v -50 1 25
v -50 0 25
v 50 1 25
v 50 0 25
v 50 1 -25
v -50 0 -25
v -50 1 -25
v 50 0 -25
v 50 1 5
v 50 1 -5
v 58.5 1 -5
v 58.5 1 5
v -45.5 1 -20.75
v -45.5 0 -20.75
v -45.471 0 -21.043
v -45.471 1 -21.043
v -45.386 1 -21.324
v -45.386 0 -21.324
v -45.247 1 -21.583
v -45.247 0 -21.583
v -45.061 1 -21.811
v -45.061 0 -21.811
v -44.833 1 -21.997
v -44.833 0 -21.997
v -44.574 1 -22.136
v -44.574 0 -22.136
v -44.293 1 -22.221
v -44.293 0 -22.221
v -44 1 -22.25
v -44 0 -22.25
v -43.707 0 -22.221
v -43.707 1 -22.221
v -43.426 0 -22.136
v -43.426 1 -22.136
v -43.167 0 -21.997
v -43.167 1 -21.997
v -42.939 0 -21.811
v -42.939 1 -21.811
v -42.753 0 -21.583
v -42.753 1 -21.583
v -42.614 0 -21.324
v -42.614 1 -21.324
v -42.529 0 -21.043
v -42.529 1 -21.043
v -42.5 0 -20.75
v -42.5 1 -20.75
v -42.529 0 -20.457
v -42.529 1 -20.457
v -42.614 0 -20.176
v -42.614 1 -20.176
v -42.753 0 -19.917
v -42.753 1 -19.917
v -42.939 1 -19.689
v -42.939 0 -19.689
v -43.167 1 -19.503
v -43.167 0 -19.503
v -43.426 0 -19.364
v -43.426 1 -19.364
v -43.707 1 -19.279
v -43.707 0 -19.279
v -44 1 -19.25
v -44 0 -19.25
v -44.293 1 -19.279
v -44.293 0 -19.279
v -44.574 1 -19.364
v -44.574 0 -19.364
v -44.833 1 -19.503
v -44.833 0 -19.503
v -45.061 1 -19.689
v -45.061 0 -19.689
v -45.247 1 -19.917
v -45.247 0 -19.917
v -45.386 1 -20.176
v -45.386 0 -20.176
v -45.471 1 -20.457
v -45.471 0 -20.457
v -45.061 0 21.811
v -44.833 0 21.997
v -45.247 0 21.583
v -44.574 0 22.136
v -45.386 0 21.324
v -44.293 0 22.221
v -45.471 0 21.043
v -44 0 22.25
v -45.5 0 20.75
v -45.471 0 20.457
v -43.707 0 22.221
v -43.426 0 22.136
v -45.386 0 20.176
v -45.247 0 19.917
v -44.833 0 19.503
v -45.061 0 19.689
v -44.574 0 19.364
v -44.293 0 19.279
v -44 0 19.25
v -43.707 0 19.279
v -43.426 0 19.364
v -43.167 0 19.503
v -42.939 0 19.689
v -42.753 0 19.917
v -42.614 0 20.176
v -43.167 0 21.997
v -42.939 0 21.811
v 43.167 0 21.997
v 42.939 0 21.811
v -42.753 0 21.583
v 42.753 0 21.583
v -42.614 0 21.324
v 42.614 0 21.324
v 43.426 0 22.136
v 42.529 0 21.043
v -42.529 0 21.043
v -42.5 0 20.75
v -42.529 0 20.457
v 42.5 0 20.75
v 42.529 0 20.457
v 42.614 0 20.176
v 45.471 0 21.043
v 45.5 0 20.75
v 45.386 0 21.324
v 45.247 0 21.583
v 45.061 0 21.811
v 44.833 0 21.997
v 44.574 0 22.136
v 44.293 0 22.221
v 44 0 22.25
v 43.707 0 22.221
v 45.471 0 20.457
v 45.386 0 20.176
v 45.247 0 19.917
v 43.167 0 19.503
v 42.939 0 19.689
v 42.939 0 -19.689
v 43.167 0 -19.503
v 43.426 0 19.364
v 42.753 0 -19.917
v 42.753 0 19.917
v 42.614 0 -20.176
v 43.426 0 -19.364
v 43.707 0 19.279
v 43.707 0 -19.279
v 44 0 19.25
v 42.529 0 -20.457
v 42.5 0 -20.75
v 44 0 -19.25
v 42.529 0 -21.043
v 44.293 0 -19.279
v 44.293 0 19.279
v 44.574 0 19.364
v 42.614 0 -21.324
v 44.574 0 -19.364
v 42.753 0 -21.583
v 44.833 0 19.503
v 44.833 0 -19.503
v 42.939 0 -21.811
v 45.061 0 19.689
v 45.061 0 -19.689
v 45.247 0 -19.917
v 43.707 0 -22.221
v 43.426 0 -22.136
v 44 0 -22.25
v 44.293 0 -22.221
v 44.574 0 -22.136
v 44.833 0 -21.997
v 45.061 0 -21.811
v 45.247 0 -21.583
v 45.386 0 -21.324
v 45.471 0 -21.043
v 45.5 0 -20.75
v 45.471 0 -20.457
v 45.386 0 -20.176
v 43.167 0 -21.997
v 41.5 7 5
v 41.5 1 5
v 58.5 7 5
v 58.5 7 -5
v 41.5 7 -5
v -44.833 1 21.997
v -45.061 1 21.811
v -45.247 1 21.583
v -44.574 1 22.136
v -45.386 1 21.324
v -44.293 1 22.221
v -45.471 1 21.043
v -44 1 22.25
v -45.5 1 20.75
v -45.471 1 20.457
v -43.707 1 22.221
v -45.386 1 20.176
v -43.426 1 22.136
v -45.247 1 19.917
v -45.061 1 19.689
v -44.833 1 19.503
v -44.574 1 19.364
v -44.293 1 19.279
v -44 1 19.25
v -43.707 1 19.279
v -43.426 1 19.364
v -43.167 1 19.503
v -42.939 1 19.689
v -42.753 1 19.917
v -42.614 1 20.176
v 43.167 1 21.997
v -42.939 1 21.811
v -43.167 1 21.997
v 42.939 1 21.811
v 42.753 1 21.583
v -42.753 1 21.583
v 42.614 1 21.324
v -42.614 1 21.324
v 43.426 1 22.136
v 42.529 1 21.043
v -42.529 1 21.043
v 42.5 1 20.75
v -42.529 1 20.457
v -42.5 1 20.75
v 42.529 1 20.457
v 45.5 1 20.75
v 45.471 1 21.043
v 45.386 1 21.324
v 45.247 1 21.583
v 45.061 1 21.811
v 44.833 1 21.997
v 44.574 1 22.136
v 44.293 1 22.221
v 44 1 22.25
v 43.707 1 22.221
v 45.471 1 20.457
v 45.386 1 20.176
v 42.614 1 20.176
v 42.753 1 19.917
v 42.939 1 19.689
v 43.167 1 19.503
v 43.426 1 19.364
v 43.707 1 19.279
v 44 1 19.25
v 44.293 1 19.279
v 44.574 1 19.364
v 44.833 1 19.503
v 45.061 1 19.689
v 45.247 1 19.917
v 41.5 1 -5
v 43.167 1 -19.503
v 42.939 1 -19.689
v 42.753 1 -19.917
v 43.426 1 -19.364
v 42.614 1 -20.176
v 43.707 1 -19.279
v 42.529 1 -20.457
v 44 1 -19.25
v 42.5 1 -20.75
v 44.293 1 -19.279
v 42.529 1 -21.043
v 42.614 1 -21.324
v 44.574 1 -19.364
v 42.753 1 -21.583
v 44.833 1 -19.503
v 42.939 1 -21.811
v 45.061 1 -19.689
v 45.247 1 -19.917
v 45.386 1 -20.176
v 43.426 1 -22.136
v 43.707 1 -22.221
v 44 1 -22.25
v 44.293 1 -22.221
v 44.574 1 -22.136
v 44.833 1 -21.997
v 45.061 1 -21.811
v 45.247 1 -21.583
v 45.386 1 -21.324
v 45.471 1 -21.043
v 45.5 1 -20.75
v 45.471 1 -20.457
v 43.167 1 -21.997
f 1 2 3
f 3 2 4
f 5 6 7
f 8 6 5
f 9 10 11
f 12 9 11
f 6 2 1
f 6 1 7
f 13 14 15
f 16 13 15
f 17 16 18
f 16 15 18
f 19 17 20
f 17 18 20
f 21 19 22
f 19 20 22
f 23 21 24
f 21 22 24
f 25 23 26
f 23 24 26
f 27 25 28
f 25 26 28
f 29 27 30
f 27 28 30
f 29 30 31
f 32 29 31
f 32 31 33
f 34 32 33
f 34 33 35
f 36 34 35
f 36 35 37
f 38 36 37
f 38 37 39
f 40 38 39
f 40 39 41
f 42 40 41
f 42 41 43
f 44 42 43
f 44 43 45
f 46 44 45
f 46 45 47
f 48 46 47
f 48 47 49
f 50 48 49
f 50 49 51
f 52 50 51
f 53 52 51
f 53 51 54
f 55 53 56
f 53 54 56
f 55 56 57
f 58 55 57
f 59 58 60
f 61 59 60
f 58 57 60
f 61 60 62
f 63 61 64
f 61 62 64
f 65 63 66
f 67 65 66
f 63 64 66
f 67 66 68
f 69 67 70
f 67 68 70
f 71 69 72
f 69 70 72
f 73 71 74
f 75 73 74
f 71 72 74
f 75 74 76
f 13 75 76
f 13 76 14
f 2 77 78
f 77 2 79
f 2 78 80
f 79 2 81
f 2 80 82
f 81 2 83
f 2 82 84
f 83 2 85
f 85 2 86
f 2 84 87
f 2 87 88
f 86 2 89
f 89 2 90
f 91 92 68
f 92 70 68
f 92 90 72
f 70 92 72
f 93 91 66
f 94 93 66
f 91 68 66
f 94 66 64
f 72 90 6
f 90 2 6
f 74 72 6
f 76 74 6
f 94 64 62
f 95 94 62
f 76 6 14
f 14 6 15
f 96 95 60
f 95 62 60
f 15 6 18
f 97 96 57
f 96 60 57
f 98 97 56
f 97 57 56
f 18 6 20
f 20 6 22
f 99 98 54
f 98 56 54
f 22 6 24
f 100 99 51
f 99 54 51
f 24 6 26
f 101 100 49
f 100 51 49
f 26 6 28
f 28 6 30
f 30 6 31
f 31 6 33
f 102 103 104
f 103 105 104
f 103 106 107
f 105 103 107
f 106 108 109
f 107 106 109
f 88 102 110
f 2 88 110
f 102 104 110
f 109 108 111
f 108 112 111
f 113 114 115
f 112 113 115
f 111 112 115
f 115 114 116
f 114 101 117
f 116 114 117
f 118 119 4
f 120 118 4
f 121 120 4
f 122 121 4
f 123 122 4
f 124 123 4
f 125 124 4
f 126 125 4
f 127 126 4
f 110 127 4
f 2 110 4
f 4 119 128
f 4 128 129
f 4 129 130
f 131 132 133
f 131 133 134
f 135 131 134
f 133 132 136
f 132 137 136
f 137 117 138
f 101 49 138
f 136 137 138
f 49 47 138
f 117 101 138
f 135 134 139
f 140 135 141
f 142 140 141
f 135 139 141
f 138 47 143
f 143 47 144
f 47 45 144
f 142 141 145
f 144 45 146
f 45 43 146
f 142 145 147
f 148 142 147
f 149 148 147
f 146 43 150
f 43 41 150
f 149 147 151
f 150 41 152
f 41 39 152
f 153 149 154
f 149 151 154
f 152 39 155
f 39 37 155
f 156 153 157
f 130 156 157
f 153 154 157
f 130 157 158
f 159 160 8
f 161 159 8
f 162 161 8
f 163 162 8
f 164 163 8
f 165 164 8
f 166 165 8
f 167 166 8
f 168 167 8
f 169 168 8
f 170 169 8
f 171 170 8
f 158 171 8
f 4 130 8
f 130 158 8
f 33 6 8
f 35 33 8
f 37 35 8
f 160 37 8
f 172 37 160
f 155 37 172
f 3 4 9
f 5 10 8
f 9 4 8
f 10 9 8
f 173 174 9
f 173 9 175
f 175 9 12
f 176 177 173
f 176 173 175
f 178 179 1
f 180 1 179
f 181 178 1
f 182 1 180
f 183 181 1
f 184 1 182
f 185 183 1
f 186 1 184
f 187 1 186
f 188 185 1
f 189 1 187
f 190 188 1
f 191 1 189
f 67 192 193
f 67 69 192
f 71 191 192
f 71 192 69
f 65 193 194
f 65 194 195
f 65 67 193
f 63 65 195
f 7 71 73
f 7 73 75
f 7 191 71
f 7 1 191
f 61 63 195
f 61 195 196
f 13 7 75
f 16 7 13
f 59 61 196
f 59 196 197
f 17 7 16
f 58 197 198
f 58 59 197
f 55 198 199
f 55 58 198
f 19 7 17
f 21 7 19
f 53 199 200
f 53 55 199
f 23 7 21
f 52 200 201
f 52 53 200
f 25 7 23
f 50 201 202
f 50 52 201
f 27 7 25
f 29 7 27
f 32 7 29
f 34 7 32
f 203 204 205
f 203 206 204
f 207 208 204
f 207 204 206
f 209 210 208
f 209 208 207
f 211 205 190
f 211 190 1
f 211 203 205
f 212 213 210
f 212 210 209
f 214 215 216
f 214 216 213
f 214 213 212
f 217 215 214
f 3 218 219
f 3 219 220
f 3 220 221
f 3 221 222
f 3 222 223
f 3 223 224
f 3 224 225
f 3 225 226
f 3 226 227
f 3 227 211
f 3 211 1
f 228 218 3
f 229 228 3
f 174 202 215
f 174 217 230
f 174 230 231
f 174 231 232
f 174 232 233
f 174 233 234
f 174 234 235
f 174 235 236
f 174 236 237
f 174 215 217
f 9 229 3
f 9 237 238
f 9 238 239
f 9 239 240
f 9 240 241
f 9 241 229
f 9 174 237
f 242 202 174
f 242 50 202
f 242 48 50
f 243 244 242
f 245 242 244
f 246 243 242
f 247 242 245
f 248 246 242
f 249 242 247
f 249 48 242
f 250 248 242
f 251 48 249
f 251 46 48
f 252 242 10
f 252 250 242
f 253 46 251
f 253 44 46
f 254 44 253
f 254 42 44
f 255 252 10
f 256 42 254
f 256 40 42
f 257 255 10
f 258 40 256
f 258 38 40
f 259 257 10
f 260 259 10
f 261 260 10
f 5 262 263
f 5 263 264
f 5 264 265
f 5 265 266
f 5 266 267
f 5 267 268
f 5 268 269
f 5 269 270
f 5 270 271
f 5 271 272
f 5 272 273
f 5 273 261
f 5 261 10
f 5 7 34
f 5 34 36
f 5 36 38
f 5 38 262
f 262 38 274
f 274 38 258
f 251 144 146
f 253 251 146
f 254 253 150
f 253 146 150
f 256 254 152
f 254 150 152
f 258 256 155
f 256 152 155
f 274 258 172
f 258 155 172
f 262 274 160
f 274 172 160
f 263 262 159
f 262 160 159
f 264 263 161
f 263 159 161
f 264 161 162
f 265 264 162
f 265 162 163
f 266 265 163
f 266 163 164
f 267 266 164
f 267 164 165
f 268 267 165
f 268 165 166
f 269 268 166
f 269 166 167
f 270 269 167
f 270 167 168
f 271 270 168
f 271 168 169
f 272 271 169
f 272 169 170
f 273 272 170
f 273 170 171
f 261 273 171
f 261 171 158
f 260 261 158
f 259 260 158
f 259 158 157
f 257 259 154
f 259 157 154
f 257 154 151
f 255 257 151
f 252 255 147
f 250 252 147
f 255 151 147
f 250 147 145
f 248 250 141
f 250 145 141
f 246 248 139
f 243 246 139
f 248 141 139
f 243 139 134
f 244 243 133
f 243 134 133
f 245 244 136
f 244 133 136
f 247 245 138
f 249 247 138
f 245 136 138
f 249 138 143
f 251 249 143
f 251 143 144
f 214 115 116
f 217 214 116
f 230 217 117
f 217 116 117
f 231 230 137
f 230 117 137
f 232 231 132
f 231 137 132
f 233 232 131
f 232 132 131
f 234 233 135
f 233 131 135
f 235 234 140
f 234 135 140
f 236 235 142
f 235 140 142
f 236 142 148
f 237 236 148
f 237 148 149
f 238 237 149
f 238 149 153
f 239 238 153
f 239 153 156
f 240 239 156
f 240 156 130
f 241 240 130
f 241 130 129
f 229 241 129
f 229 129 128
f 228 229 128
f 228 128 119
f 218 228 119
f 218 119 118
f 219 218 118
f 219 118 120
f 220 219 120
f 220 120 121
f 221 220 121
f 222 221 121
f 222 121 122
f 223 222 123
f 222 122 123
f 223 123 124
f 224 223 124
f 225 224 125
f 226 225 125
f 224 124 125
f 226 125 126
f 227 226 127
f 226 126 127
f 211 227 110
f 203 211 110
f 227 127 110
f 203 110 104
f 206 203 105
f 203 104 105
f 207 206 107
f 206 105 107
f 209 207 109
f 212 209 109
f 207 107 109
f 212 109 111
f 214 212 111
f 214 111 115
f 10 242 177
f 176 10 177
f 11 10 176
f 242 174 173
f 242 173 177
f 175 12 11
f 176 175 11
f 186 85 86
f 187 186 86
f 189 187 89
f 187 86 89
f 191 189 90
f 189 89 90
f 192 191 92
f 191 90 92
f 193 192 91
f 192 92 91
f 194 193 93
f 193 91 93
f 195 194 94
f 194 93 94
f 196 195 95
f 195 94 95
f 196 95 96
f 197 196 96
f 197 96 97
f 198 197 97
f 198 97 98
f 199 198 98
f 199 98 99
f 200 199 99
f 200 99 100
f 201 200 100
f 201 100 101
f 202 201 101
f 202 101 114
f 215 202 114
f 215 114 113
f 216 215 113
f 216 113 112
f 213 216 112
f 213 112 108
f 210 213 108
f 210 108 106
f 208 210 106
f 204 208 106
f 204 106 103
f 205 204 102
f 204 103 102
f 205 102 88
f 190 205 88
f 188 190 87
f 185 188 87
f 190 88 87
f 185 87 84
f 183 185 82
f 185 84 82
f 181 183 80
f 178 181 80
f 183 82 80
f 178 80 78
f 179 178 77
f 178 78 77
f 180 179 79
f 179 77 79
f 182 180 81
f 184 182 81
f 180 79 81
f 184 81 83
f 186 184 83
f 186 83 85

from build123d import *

# Parameters (mm, degrees)
SKETCH_1_W      = 100
SKETCH_1_H      = 50
EXTRUDE_1_DEPTH = 1
SKETCH_2_W      = 17
SKETCH_2_H      = 10
EXTRUDE_2_DEPTH = 6
HOLE_WIZARD_1_D = 3


with BuildPart() as part:
    # 草图1 → 凸台-拉伸1 (new body)
    with BuildSketch(Plane(origin=(0, 0, 0), x_dir=(1, 0, 0), z_dir=(0, 1, 0))):
        Rectangle(SKETCH_1_W, SKETCH_1_H)
    extrude(amount=EXTRUDE_1_DEPTH)

    # 草图2 → 凸台-拉伸2 (add)
    with BuildSketch(Plane(origin=(0, 1, 0), x_dir=(1, 0, 0), z_dir=(0, 1, 0))):
        with Locations((50, 0)):
            Rectangle(SKETCH_2_W, SKETCH_2_H)
    extrude(amount=EXTRUDE_2_DEPTH)

    # 孔1 (through all)
    with Locations(Plane(origin=(0, 1, 0), x_dir=(1, 0, 0), z_dir=(0, 1, 0))):
        with Locations((-44, 20.75), (-44, -20.75), (44, -20.75), (44, 20.75)):
            Hole(HOLE_WIZARD_1_D / 2)


solid = part.part
